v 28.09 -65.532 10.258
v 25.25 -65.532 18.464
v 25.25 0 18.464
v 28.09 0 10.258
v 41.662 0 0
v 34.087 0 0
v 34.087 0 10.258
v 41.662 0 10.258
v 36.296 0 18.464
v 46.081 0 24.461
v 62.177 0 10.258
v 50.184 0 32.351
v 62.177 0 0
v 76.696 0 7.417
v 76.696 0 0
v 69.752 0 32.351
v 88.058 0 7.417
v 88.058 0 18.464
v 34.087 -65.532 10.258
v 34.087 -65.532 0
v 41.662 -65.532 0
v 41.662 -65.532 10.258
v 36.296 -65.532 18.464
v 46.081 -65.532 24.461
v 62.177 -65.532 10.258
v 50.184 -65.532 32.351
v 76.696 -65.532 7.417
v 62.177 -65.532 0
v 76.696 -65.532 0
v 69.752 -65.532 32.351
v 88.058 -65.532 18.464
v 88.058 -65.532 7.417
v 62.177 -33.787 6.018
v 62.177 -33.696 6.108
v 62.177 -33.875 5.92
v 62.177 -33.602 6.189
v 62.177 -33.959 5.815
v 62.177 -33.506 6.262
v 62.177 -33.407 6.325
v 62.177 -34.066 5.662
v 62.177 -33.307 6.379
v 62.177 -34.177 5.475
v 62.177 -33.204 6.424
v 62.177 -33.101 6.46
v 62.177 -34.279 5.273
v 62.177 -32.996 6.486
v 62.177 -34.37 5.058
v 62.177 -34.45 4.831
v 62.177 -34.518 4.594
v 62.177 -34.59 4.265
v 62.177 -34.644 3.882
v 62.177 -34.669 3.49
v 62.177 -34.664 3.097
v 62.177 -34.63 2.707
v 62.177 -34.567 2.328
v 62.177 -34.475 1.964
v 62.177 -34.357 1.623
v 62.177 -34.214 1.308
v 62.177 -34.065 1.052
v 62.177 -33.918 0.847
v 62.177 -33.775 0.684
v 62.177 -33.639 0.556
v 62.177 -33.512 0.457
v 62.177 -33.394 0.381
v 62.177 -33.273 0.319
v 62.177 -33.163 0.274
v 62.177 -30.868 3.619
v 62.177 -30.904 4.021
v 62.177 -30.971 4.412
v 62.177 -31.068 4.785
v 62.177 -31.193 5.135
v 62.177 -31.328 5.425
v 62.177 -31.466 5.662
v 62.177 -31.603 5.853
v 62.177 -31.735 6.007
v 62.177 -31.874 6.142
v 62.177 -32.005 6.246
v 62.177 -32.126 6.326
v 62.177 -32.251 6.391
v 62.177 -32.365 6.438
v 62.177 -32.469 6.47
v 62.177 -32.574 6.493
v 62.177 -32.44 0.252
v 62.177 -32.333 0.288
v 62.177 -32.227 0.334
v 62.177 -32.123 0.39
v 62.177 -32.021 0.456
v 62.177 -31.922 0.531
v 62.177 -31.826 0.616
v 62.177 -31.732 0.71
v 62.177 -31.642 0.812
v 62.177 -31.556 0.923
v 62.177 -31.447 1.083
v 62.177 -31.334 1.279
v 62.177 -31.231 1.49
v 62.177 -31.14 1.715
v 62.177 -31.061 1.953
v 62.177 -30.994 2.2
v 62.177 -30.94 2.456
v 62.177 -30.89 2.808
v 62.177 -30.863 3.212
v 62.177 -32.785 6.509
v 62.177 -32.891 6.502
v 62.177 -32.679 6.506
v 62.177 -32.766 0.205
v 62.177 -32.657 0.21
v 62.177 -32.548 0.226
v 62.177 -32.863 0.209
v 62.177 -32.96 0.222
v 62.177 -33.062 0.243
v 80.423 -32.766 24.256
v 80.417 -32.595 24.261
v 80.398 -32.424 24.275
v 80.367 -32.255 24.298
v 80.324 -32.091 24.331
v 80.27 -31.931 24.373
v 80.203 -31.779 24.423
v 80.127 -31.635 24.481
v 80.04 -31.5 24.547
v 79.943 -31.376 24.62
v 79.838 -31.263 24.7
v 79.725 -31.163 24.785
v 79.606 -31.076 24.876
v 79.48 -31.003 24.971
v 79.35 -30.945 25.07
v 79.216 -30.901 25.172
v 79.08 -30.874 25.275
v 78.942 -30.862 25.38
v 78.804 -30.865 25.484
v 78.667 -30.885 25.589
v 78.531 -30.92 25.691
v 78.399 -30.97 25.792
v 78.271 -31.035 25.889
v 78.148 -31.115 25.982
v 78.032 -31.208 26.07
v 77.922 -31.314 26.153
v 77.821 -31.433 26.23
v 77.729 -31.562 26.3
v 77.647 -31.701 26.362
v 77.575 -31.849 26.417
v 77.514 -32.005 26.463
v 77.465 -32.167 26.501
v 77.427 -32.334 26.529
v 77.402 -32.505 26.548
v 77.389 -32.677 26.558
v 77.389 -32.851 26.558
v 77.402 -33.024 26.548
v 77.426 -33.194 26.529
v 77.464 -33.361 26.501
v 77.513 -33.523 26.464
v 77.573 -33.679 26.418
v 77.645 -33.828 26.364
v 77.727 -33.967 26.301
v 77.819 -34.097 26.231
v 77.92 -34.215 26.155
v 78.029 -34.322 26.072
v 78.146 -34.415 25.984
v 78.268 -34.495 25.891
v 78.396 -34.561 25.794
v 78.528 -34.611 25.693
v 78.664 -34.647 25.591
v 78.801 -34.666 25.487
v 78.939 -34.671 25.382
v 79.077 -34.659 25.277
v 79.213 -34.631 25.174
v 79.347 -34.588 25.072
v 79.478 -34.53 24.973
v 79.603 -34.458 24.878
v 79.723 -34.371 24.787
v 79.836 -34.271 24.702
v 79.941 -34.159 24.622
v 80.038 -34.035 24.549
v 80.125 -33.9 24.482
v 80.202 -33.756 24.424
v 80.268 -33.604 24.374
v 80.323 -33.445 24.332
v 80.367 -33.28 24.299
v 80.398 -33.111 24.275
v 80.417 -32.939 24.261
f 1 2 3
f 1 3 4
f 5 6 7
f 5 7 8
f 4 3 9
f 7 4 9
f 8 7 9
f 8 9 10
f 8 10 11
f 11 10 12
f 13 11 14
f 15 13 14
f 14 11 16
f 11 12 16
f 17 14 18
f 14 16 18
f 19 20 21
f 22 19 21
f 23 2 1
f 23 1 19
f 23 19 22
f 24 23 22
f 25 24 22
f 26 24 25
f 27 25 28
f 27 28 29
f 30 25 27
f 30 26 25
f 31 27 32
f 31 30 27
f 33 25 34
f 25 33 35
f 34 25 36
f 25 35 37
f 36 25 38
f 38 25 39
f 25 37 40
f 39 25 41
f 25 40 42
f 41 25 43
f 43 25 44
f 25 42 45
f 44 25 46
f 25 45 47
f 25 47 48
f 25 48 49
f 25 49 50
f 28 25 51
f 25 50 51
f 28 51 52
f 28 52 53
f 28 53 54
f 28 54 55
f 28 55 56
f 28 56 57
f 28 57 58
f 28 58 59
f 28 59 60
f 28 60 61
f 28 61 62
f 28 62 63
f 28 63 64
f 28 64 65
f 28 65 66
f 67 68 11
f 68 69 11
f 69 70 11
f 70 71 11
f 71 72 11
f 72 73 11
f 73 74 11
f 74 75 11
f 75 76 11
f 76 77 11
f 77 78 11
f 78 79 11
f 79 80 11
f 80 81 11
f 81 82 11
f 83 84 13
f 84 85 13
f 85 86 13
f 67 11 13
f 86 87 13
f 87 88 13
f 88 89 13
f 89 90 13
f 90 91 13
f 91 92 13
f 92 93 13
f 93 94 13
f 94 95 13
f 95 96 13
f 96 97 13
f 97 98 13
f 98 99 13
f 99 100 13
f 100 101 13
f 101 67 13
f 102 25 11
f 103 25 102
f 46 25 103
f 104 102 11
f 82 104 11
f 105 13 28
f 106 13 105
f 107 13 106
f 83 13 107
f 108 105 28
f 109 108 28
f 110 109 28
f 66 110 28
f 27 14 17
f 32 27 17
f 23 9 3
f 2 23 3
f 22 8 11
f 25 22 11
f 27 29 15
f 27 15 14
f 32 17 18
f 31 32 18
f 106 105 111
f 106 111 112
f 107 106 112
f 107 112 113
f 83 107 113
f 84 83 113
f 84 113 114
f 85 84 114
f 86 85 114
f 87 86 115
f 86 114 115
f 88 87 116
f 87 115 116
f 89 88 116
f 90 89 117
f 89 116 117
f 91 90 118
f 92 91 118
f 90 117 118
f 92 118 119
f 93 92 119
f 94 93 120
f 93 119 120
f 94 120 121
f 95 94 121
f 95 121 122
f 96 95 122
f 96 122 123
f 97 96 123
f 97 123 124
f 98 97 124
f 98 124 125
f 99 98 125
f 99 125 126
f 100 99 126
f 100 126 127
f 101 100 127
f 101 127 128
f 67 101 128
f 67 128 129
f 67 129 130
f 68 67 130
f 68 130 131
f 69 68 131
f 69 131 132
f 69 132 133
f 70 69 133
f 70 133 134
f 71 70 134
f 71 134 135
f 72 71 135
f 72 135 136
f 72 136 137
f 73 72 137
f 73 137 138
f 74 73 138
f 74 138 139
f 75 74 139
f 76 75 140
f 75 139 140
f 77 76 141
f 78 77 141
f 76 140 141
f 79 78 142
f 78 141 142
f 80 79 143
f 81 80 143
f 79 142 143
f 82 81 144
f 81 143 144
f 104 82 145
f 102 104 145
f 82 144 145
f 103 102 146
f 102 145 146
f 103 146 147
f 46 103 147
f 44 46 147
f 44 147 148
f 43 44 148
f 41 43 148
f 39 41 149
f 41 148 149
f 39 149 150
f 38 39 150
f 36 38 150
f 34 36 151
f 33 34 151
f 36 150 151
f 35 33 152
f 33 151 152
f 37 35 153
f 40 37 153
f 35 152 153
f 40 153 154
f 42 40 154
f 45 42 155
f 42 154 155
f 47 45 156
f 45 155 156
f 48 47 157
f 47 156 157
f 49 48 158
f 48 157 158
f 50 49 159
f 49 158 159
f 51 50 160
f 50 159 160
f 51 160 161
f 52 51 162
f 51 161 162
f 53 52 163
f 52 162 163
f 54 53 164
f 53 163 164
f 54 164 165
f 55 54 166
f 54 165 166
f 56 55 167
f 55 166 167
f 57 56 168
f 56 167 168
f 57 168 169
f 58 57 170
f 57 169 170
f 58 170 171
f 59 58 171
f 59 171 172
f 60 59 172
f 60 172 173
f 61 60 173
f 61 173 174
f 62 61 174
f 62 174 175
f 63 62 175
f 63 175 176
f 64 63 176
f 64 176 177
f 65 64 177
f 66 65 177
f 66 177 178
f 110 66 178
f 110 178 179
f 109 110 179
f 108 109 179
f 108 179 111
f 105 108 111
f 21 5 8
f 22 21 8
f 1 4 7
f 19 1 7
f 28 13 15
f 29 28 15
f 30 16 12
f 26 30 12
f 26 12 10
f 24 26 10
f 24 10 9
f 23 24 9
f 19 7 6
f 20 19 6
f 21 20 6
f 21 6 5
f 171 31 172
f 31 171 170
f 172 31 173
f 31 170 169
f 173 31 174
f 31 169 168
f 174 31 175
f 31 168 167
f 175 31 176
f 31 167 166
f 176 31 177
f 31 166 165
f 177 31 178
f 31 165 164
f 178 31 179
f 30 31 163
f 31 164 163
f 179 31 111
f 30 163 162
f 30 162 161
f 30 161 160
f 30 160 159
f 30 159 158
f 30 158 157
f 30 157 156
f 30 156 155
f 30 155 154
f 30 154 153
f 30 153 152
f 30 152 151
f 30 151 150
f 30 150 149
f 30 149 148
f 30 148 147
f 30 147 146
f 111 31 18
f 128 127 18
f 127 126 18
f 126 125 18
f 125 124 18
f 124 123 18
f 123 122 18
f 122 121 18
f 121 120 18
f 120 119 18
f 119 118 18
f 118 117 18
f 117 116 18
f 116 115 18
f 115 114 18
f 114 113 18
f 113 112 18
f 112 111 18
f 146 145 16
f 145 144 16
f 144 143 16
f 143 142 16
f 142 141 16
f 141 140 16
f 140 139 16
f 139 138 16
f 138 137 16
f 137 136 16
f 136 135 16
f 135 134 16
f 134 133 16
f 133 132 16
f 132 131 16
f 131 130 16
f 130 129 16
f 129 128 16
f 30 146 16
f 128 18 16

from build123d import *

# Parameters (mm, degrees)
F1_DEPTH = 65.532
F2_R     = 1.905
F3_DEPTH = 52.671675


with BuildPart() as f1:
    # F0 (on Front) → F1 (new body)
    with BuildSketch(Plane.XZ):
        Polygon((34.087103, 10.257693), (34.087103, 0), (41.662011, 0), (41.662011, 10.257693), (62.177397, 10.257693), (62.177397, 0), (76.695979, 0), (76.695979, 7.417101), (88.058345, 7.417101), (88.058345, 18.463846), (69.752306, 32.351185), (50.183784, 32.351185), (46.080712, 24.460651), (36.29645, 18.463846), (25.249707, 18.463846), (28.090296, 10.257693), align=None)
    extrude(amount=F1_DEPTH)

    # F2 (on face) → F3 (cut, through all)
    with BuildSketch(Plane(origin=(41.056729, 0, 54.12024), x_dir=(0.796691, 0, -0.604386), z_dir=(0.604386, 0, 0.796691))):
        with Locations((47.507229, -32.766)):
            Circle(F2_R)
    extrude(amount=-F3_DEPTH, mode=Mode.SUBTRACT)


solid = f1.part
